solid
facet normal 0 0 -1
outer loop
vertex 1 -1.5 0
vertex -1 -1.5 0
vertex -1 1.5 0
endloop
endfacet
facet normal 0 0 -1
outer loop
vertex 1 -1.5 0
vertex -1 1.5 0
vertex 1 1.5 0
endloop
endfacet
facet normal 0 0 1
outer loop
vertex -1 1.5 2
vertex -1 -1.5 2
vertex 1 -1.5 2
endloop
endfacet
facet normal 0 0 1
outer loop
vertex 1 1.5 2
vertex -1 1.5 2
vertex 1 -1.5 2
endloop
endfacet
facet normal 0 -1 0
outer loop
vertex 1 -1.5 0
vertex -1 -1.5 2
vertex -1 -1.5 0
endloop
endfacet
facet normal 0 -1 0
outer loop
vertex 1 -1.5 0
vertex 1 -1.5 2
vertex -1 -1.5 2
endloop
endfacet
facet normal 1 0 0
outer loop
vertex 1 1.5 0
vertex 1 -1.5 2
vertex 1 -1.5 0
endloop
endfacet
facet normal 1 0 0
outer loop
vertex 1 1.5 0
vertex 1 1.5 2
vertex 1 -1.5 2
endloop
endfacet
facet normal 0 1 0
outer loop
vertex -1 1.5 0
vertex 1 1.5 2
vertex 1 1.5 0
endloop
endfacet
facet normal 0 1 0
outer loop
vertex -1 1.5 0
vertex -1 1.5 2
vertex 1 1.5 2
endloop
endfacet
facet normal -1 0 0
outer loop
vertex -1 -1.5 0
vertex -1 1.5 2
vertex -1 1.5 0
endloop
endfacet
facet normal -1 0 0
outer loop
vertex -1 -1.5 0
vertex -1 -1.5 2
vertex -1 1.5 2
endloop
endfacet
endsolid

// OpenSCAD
$fn=100;
linear_extrude(height=2) square(size=[2, 3], center=true);
